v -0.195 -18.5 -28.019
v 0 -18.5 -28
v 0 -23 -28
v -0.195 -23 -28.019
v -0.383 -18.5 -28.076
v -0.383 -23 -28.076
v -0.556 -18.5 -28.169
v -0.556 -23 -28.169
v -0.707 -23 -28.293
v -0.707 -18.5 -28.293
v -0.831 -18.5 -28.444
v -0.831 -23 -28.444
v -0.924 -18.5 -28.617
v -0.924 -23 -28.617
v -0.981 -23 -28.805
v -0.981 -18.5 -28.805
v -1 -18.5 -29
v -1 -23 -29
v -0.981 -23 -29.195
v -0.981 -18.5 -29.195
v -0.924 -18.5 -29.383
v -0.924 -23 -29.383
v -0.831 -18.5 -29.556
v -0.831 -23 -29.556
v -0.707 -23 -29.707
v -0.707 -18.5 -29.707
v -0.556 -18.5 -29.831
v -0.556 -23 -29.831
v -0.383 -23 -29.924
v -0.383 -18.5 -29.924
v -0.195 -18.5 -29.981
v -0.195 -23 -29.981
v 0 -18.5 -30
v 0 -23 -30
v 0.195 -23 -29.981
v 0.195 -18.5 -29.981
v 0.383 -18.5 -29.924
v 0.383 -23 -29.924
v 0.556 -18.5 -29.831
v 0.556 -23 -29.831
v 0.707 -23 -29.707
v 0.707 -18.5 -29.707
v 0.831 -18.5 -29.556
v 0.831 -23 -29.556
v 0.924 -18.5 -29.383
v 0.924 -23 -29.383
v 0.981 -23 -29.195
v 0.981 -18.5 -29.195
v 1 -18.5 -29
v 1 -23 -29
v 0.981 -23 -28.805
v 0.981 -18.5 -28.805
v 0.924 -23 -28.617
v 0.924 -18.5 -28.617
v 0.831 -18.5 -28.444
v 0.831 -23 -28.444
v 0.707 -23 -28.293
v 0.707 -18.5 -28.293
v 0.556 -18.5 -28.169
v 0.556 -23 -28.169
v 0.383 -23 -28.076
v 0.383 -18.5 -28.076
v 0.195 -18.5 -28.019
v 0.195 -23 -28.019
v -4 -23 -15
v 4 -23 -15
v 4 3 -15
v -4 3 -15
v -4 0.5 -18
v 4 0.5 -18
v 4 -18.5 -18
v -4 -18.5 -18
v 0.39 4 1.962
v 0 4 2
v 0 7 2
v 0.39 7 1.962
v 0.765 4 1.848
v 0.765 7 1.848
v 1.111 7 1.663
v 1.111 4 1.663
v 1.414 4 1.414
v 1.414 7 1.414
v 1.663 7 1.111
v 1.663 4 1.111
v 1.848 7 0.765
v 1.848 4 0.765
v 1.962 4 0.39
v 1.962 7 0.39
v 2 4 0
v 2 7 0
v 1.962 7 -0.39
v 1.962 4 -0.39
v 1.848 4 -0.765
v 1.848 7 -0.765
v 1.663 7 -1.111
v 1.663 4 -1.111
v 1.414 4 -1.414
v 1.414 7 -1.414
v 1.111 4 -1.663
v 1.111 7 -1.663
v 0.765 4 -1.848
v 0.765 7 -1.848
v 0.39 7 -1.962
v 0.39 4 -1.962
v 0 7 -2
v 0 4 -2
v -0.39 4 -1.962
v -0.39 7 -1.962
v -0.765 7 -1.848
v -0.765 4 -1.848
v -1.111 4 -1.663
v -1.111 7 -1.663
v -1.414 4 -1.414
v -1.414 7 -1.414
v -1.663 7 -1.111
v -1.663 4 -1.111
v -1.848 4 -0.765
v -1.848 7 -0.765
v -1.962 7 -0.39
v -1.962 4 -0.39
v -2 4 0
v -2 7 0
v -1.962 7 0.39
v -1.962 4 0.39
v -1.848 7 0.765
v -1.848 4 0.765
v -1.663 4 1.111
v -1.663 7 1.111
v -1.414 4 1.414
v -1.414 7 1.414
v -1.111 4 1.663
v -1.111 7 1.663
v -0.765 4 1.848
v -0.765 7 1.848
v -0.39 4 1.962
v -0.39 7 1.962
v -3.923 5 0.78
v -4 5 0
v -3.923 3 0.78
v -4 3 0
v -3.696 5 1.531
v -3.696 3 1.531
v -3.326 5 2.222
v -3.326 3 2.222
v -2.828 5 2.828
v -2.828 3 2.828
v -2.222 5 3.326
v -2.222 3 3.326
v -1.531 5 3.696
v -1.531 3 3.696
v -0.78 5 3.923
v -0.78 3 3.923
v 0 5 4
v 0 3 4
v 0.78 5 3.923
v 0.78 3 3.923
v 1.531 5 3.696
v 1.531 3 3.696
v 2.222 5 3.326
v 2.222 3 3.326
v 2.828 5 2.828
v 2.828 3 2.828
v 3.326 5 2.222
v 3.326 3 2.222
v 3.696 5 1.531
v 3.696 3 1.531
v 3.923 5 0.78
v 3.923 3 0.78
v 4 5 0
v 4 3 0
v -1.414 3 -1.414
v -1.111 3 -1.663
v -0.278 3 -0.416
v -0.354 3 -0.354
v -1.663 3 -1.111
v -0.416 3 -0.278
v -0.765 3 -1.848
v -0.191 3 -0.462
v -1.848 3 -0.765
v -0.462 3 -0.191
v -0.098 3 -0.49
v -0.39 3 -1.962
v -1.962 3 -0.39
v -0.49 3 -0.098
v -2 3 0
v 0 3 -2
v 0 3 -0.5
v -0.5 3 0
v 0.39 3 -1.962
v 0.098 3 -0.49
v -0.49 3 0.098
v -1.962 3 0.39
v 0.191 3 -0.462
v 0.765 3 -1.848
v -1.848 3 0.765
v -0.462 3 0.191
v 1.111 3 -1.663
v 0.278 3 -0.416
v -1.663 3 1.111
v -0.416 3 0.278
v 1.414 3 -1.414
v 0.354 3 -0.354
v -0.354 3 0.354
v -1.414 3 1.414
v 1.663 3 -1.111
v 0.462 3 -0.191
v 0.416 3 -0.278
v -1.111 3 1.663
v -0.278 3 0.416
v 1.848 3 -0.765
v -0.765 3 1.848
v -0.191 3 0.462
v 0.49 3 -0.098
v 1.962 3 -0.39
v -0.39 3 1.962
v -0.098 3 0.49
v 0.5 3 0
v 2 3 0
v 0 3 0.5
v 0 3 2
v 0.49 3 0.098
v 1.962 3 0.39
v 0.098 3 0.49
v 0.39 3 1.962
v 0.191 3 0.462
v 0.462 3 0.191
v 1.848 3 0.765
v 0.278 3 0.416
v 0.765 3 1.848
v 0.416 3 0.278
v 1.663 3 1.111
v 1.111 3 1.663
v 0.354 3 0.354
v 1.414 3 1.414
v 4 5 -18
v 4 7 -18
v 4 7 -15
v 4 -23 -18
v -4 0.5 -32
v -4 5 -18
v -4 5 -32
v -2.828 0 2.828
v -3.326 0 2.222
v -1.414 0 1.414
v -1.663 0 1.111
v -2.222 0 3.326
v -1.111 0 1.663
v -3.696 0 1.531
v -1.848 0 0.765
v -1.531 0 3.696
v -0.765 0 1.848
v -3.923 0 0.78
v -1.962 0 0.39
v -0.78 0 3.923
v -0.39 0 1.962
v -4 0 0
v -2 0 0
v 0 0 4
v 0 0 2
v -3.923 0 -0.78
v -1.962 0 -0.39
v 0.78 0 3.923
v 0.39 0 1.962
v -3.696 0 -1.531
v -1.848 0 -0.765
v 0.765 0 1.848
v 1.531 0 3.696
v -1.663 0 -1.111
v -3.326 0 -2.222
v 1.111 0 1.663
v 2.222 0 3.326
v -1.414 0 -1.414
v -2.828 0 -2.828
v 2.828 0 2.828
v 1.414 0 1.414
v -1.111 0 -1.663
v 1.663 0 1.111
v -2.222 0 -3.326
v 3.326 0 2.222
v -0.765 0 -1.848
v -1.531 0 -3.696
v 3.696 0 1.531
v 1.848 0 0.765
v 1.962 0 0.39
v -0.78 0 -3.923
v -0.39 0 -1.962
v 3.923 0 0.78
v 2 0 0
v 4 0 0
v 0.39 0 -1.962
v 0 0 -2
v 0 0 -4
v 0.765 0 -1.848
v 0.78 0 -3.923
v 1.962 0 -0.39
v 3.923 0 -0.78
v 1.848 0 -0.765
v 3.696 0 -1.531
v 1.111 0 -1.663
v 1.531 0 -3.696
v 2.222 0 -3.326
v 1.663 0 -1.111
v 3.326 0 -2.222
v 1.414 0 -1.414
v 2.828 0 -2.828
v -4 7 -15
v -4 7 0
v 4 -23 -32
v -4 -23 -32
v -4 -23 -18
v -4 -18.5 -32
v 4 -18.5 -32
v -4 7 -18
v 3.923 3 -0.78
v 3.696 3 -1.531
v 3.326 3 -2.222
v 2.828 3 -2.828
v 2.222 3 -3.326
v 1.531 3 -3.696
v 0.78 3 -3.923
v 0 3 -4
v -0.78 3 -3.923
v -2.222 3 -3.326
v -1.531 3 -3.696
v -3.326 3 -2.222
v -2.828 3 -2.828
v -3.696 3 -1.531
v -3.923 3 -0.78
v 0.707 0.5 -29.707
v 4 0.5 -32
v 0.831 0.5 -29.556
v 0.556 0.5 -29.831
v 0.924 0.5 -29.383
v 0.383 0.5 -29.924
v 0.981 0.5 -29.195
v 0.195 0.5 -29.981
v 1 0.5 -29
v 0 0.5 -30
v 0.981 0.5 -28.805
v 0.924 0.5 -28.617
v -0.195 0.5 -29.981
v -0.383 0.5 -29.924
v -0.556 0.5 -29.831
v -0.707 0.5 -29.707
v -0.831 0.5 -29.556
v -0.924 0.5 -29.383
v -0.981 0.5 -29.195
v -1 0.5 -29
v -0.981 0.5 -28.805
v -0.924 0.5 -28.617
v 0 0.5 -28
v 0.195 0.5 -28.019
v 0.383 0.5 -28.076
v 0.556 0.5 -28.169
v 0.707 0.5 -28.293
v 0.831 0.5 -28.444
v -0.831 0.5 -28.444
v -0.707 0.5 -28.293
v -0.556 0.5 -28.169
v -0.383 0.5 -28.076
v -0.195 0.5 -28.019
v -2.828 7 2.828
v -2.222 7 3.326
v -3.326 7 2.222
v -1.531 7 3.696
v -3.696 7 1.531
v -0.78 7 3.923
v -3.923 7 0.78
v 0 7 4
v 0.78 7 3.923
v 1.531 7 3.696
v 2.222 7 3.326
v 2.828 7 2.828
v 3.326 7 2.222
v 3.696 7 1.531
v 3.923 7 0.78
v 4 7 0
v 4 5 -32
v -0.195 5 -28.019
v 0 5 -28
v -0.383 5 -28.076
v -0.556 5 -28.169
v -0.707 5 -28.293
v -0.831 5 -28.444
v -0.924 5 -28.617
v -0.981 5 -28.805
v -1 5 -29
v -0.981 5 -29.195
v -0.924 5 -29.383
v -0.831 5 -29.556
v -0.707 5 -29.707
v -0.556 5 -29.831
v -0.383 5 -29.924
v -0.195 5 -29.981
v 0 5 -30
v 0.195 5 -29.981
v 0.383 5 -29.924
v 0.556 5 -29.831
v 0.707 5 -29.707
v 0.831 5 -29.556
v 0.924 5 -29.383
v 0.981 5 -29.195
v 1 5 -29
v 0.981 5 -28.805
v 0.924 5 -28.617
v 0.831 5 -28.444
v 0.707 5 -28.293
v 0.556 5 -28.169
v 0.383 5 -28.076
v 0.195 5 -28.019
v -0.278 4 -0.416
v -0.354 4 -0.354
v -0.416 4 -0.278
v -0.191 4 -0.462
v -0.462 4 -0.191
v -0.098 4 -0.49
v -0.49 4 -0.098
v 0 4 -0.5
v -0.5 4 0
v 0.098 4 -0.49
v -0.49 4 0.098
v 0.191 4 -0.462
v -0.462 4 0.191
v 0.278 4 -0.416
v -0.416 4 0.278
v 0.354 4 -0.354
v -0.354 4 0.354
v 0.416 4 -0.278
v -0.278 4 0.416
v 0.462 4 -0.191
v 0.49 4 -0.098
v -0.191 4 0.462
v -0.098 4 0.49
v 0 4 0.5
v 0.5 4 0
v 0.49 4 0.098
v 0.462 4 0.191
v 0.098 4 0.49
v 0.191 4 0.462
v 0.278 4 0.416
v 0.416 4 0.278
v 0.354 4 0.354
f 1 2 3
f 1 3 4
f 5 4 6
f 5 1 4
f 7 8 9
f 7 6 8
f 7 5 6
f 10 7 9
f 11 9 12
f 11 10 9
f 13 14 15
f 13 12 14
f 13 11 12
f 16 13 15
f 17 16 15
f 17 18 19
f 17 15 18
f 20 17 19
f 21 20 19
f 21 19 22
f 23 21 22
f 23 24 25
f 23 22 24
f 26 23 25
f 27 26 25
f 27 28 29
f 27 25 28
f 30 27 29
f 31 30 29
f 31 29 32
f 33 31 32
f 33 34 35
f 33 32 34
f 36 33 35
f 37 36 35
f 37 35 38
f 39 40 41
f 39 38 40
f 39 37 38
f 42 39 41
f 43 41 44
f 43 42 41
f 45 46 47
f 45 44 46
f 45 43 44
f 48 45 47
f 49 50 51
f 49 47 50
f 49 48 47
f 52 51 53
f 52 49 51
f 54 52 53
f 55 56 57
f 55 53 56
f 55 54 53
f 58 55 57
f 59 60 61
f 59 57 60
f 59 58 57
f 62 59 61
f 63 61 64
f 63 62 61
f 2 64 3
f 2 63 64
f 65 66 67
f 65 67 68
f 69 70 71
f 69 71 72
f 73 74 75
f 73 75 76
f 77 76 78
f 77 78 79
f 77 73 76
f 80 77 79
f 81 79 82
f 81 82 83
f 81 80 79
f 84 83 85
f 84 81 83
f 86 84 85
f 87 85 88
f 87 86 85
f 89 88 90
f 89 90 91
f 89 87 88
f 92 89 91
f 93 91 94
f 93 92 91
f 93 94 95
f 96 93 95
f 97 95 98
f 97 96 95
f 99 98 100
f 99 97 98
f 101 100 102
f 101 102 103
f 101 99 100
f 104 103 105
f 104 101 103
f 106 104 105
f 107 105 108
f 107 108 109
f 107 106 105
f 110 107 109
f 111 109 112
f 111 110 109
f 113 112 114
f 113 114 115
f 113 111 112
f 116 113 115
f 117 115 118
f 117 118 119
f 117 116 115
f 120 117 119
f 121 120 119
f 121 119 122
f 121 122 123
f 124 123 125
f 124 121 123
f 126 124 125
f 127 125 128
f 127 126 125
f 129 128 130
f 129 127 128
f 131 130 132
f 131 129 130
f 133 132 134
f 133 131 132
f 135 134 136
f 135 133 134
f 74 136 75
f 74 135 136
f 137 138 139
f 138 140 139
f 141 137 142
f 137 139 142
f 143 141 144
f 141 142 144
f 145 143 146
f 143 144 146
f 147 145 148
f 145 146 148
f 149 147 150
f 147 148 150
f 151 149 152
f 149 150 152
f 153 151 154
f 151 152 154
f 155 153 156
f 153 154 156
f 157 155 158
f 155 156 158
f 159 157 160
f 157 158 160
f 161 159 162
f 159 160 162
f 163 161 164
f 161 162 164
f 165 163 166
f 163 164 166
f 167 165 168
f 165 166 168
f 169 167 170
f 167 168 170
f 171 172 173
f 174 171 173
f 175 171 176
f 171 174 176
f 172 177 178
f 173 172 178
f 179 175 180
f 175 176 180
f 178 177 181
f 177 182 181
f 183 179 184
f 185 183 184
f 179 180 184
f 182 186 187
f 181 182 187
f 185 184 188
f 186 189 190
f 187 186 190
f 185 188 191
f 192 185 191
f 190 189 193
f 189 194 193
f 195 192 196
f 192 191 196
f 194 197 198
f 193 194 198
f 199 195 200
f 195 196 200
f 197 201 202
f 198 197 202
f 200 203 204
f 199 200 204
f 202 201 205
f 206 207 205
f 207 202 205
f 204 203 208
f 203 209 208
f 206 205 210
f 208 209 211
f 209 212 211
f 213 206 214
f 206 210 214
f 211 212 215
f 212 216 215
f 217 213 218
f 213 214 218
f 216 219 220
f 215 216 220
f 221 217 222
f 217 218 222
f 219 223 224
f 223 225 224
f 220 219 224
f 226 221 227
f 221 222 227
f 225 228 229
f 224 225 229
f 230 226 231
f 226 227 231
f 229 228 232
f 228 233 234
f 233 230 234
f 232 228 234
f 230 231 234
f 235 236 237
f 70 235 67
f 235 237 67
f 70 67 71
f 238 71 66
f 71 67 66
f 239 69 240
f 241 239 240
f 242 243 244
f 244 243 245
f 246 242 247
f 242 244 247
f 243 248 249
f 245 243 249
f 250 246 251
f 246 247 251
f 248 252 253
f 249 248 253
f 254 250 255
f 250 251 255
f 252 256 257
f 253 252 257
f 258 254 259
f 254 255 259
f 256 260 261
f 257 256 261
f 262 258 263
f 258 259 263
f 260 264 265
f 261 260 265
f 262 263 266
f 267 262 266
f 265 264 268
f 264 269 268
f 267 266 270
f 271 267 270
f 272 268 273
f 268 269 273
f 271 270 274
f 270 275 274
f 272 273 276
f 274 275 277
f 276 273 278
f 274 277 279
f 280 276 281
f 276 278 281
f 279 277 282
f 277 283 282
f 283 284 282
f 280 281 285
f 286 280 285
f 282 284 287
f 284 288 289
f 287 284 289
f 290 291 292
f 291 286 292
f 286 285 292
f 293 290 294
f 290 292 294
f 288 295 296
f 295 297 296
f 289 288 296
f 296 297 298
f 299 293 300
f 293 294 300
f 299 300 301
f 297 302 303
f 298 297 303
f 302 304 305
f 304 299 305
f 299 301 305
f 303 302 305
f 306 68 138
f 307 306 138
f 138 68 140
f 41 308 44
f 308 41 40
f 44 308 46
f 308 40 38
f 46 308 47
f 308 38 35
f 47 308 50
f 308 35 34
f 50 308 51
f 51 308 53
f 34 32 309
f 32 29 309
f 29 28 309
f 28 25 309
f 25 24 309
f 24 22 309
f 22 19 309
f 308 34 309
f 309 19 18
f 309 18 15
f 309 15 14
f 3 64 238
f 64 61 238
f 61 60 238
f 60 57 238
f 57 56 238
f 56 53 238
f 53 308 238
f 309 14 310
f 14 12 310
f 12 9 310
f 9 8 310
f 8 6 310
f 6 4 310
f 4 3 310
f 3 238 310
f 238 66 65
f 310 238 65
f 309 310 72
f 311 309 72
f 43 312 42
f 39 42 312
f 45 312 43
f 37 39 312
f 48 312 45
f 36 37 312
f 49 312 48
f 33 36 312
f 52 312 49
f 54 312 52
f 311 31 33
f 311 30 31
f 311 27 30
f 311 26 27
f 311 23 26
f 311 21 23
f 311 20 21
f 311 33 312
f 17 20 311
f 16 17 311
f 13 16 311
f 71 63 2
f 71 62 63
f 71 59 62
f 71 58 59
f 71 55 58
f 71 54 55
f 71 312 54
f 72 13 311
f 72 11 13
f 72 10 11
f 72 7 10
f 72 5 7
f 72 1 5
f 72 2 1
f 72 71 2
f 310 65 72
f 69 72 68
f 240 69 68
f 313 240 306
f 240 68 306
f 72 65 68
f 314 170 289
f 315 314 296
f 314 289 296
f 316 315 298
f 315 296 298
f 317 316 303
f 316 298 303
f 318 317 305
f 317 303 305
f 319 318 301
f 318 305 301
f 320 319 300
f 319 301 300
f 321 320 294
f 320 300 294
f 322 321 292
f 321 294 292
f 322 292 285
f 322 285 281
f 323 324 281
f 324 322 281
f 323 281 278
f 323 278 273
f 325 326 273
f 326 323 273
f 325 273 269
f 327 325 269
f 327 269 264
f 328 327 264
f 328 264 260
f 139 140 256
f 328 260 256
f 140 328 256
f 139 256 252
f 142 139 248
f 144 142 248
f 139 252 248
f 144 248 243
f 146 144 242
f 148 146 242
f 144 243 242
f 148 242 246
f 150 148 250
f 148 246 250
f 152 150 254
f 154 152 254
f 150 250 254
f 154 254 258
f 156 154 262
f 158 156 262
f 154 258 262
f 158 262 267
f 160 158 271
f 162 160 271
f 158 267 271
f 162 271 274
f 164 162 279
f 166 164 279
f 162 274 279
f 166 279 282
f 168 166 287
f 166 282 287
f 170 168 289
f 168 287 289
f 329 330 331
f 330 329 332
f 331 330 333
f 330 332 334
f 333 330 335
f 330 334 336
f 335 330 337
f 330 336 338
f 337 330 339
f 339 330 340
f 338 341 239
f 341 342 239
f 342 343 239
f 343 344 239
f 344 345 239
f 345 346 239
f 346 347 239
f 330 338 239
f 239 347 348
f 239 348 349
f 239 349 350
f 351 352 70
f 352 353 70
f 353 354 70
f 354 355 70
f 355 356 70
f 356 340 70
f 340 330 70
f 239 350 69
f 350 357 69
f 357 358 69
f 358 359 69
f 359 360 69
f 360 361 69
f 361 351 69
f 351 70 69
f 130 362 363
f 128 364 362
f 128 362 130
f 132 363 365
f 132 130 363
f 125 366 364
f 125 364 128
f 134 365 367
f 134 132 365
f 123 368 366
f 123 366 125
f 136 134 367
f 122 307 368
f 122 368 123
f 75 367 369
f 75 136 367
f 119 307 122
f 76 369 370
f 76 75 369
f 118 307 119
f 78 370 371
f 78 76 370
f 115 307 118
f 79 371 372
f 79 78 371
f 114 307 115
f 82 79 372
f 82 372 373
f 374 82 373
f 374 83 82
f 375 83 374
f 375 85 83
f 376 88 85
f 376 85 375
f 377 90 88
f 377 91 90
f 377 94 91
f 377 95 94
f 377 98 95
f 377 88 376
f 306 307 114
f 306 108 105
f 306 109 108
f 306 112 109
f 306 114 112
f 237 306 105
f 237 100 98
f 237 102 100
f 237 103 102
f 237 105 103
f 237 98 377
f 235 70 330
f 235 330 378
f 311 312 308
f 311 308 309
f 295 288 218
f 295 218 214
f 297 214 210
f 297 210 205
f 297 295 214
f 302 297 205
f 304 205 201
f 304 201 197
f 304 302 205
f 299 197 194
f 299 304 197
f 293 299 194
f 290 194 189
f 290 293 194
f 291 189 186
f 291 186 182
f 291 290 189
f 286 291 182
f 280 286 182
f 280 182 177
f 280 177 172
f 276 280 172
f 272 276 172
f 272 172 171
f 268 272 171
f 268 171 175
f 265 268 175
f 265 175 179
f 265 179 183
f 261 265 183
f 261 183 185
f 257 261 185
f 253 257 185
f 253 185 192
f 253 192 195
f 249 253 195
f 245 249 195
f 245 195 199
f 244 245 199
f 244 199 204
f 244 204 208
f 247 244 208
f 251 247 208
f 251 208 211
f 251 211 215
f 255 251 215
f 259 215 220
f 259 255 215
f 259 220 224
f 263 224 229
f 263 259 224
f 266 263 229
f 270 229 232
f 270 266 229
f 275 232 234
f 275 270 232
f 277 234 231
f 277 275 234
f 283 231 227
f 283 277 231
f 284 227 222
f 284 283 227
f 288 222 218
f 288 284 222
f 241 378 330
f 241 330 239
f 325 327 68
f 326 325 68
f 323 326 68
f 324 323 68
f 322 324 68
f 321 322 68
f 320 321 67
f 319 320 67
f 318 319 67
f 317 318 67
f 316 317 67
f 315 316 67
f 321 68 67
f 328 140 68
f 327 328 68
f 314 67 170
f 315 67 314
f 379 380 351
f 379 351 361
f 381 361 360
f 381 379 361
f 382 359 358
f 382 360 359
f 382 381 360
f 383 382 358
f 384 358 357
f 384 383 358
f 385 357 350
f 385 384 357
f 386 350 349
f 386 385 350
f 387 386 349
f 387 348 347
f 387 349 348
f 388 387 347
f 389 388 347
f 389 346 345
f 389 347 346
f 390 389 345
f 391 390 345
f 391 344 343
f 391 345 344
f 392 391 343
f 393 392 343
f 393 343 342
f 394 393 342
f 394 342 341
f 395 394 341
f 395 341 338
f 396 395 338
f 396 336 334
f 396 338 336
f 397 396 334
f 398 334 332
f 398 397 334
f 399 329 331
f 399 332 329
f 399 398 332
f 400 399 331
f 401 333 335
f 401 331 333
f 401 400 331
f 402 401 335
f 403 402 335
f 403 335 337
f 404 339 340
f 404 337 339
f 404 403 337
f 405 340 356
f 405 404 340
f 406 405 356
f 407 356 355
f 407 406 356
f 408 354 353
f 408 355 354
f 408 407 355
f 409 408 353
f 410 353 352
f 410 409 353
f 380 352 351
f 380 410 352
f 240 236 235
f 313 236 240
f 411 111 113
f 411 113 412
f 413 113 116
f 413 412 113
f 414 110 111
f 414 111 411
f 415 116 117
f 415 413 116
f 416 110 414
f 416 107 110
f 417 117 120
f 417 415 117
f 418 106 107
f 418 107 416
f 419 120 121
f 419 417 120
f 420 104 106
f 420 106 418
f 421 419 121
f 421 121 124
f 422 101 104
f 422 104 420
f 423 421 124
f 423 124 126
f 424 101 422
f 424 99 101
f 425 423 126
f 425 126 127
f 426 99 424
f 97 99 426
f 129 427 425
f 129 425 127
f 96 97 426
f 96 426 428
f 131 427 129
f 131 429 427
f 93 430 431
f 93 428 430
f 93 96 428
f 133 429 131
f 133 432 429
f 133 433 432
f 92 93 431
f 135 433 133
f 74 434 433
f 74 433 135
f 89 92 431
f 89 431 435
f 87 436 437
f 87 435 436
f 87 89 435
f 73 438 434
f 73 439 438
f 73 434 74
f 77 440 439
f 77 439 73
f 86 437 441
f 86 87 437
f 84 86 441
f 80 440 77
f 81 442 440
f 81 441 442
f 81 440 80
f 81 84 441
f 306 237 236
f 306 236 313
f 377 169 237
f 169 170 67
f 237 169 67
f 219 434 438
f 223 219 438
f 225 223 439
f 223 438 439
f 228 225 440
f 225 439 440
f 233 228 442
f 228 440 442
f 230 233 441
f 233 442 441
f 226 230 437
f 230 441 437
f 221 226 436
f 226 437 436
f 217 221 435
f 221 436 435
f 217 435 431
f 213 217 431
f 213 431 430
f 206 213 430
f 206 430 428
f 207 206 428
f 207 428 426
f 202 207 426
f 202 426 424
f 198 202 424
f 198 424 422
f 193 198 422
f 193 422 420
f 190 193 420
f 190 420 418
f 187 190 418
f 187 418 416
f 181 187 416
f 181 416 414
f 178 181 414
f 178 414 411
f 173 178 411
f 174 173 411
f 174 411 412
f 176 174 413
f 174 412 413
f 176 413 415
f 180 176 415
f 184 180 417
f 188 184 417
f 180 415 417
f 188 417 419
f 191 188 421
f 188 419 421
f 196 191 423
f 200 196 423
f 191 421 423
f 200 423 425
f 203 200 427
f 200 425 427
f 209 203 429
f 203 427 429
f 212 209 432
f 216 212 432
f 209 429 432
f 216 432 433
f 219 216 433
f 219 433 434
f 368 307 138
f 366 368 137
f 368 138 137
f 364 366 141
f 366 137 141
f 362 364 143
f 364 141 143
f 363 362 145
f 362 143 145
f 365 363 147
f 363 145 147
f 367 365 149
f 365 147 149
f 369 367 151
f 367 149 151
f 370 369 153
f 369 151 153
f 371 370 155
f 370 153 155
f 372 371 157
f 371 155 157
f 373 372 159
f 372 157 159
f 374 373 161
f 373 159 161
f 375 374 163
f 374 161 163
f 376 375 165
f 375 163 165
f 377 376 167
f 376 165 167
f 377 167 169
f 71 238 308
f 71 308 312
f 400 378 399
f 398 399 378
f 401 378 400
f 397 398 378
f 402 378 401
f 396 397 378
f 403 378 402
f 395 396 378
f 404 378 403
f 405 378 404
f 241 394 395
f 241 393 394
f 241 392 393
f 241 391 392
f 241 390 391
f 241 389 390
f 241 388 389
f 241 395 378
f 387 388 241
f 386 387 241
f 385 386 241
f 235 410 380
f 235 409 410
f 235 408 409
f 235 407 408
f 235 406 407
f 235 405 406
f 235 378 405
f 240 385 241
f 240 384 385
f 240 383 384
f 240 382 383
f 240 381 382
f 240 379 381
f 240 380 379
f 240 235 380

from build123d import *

# Parameters (mm, degrees)
SKETCH_1_R               = 4
SKETCH_1_R_2             = 2
EXTRUDE_1_DEPTH          = 3
SKETCH_2_R               = 4
SKETCH_2_R_2             = 2
EXTRUDE_1_2_DEPTH        = 2
EXTRUDE_2_DEPTH          = 2
EXTRUDE_2_DEPTH_BACK     = 2
SKETCH_4_W               = 8
SKETCH_4_H               = 26
SKETCH_4_H_2             = 4
EXTRUDE_3_DEPTH          = 3
SKETCH_5_W               = 8
SKETCH_5_H               = 4.5
EXTRUDE_4_DEPTH          = 14
CUT_EXTRUDE_1_DEPTH      = 26
CUT_EXTRUDE_1_DEPTH_BACK = 40.903007405
SKETCH_6_R               = 1
CUT_EXTRUDE_START        = -3
SKETCH_7_R               = 2
CUT_EXTRUDE_2_DEPTH      = 3
CUT_EXTRUDE_3_REACH      = 44.059
SKETCH_8_R               = 0.5


with BuildPart() as part:
    # 草图1 → Extrude 1 (new body)
    with BuildSketch(Plane(origin=(0, 0, 0), x_dir=(1, 0, 0), z_dir=(0, 1, 0))):
        Circle(SKETCH_1_R)
        Circle(SKETCH_1_R_2, mode=Mode.SUBTRACT)
    extrude(amount=EXTRUDE_1_DEPTH)

    # 草图2 → Extrude 1 2 (add)
    # profile 1 of 2: a face of its own
    with BuildSketch(Plane(origin=(0, 3, 0), x_dir=(1, 0, 0), z_dir=(0, 1, 0))):
        Circle(SKETCH_2_R)
        with Locations(Location((0, 0, 0), (0, 0, 270))):
            Circle(SKETCH_2_R_2, mode=Mode.SUBTRACT)
    # profile 2 of 2: a face of its own
    with BuildSketch(Plane(origin=(0, 3, 0), x_dir=(1, 0, 0), z_dir=(0, 1, 0))):
        with Locations(Location((0, 0, 0), (0, 0, 270))):
            Circle(SKETCH_2_R_2)
    extrude(amount=EXTRUDE_1_2_DEPTH)

    # 草图3 → 凸台-拉伸2 (add, two sides: drawn at the far end of the back side and taken through both)
    with BuildSketch(Plane(origin=(0, 5, 0), x_dir=(1, 0, 0), z_dir=(0, 1, 0)).offset(-EXTRUDE_2_DEPTH_BACK)):
        with BuildLine():
            ThreePointArc((4, 0), (0, 4), (-4, 0))
            Line((-4, 0), (4, 0))
        make_face()
        with BuildLine():
            Line((4, 0), (-4, 0))
            ThreePointArc((-4, 0), (0, -4), (4, 0))
        make_face()
        with BuildLine():
            ThreePointArc((4, 0), (0, 4), (-4, 0))
            Line((-4, 0), (4, 0))
        make_face()
        with BuildLine():
            Line((4, 0), (-4, 0))
            ThreePointArc((-4, 0), (0, -4), (4, 0))
        make_face()
        with BuildLine():
            Line((4, 15), (-4, 15))
            Line((-4, 15), (-4, 0))
            ThreePointArc((-4, 0), (0, 4), (4, 0))
            Line((4, 0), (4, 15))
        make_face()
    extrude(amount=EXTRUDE_2_DEPTH + EXTRUDE_2_DEPTH_BACK)

    # 草图4 → 凸台-拉伸3 (add)
    with BuildSketch(Plane(origin=(0, 0, -15), x_dir=(-1, 0, 0), z_dir=(0, 0, -1))):
        with Locations((0, -10)):
            Rectangle(SKETCH_4_W, SKETCH_4_H)
        with Locations((0, 5)):
            Rectangle(SKETCH_4_W, SKETCH_4_H_2)
    extrude(amount=EXTRUDE_3_DEPTH)

    # 草图5 → 凸台-拉伸4 (add)
    with BuildSketch(Plane(origin=(0, 0, -18), x_dir=(-1, 0, 0), z_dir=(0, 0, -1))):
        with Locations((0, 2.75)):
            Rectangle(SKETCH_5_W, SKETCH_5_H)
        with Locations((0, -20.75)):
            Rectangle(SKETCH_5_W, SKETCH_5_H)
    extrude(amount=EXTRUDE_4_DEPTH)

    # 草图6 → 切除-拉伸1 (cut, two sides: drawn at the far end of the back side and taken through both)
    with BuildSketch(Plane.XZ.offset(-0.5).offset(-CUT_EXTRUDE_1_DEPTH_BACK)):
        with Locations(Location((0, -29, 0), (0, 0, 90))):
            Circle(SKETCH_6_R)
    extrude(amount=CUT_EXTRUDE_1_DEPTH + CUT_EXTRUDE_1_DEPTH_BACK, mode=Mode.SUBTRACT)

    # 草图7 → 切除-拉伸2 (cut)
    with BuildSketch(Plane(origin=(0, 7, 0), x_dir=(1, 0, 0), z_dir=(0, 1, 0)).offset(CUT_EXTRUDE_START)):
        with Locations(Location((0, 0, 0), (0, 0, 270))):
            Circle(SKETCH_7_R)
    extrude(amount=CUT_EXTRUDE_2_DEPTH, mode=Mode.SUBTRACT)

    # 草图8 → 切除-拉伸3 (cut, up to next)
    with BuildSketch(Plane(origin=(0, 4, 0), x_dir=(1, 0, 0), z_dir=(0, 1, 0)), mode=Mode.PRIVATE) as cut_extrude_3_sk1:
        with Locations(Location((0, 0, 0), (0, 0, 270))):
            Circle(SKETCH_8_R)
    cut_extrude_3_tool1 = extrude(cut_extrude_3_sk1.sketch, amount=-CUT_EXTRUDE_3_REACH, mode=Mode.PRIVATE) & part.part
    add(cut_extrude_3_tool1.solids().sort_by_distance((0, 4, 0))[0], mode=Mode.SUBTRACT)


solid = part.part
